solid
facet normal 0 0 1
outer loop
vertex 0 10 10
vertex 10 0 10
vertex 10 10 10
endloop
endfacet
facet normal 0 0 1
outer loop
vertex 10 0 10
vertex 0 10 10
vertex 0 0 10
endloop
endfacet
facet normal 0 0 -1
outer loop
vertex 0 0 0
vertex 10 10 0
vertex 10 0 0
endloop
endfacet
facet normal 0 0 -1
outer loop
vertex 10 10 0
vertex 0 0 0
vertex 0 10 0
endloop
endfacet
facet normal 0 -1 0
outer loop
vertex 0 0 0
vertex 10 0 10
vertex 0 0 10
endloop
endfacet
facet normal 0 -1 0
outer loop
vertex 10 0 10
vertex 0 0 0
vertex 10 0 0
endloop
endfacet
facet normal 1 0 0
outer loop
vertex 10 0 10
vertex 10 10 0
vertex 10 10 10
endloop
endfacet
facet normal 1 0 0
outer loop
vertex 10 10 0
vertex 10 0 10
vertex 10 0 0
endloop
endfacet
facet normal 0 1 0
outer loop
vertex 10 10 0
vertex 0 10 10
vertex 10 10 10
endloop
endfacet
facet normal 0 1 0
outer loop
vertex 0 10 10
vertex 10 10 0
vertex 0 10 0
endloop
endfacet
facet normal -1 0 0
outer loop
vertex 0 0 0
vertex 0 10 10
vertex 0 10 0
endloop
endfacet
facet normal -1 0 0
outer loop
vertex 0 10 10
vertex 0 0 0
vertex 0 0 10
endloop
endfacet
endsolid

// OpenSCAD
// file: helpers.scad
function double(x) = x * 2;
function unused_fn(x) = x + 999;
module unused_mod() { sphere(1); }
module helper_box(s) { cube([s, s, s]); }
// file: geometry.scad
include <helpers.scad>

x = 42;

module base_shape(size) {
    helper_box(size);
}
// main file
include <geometry.scad>

size = double(5);
base_shape(size);
